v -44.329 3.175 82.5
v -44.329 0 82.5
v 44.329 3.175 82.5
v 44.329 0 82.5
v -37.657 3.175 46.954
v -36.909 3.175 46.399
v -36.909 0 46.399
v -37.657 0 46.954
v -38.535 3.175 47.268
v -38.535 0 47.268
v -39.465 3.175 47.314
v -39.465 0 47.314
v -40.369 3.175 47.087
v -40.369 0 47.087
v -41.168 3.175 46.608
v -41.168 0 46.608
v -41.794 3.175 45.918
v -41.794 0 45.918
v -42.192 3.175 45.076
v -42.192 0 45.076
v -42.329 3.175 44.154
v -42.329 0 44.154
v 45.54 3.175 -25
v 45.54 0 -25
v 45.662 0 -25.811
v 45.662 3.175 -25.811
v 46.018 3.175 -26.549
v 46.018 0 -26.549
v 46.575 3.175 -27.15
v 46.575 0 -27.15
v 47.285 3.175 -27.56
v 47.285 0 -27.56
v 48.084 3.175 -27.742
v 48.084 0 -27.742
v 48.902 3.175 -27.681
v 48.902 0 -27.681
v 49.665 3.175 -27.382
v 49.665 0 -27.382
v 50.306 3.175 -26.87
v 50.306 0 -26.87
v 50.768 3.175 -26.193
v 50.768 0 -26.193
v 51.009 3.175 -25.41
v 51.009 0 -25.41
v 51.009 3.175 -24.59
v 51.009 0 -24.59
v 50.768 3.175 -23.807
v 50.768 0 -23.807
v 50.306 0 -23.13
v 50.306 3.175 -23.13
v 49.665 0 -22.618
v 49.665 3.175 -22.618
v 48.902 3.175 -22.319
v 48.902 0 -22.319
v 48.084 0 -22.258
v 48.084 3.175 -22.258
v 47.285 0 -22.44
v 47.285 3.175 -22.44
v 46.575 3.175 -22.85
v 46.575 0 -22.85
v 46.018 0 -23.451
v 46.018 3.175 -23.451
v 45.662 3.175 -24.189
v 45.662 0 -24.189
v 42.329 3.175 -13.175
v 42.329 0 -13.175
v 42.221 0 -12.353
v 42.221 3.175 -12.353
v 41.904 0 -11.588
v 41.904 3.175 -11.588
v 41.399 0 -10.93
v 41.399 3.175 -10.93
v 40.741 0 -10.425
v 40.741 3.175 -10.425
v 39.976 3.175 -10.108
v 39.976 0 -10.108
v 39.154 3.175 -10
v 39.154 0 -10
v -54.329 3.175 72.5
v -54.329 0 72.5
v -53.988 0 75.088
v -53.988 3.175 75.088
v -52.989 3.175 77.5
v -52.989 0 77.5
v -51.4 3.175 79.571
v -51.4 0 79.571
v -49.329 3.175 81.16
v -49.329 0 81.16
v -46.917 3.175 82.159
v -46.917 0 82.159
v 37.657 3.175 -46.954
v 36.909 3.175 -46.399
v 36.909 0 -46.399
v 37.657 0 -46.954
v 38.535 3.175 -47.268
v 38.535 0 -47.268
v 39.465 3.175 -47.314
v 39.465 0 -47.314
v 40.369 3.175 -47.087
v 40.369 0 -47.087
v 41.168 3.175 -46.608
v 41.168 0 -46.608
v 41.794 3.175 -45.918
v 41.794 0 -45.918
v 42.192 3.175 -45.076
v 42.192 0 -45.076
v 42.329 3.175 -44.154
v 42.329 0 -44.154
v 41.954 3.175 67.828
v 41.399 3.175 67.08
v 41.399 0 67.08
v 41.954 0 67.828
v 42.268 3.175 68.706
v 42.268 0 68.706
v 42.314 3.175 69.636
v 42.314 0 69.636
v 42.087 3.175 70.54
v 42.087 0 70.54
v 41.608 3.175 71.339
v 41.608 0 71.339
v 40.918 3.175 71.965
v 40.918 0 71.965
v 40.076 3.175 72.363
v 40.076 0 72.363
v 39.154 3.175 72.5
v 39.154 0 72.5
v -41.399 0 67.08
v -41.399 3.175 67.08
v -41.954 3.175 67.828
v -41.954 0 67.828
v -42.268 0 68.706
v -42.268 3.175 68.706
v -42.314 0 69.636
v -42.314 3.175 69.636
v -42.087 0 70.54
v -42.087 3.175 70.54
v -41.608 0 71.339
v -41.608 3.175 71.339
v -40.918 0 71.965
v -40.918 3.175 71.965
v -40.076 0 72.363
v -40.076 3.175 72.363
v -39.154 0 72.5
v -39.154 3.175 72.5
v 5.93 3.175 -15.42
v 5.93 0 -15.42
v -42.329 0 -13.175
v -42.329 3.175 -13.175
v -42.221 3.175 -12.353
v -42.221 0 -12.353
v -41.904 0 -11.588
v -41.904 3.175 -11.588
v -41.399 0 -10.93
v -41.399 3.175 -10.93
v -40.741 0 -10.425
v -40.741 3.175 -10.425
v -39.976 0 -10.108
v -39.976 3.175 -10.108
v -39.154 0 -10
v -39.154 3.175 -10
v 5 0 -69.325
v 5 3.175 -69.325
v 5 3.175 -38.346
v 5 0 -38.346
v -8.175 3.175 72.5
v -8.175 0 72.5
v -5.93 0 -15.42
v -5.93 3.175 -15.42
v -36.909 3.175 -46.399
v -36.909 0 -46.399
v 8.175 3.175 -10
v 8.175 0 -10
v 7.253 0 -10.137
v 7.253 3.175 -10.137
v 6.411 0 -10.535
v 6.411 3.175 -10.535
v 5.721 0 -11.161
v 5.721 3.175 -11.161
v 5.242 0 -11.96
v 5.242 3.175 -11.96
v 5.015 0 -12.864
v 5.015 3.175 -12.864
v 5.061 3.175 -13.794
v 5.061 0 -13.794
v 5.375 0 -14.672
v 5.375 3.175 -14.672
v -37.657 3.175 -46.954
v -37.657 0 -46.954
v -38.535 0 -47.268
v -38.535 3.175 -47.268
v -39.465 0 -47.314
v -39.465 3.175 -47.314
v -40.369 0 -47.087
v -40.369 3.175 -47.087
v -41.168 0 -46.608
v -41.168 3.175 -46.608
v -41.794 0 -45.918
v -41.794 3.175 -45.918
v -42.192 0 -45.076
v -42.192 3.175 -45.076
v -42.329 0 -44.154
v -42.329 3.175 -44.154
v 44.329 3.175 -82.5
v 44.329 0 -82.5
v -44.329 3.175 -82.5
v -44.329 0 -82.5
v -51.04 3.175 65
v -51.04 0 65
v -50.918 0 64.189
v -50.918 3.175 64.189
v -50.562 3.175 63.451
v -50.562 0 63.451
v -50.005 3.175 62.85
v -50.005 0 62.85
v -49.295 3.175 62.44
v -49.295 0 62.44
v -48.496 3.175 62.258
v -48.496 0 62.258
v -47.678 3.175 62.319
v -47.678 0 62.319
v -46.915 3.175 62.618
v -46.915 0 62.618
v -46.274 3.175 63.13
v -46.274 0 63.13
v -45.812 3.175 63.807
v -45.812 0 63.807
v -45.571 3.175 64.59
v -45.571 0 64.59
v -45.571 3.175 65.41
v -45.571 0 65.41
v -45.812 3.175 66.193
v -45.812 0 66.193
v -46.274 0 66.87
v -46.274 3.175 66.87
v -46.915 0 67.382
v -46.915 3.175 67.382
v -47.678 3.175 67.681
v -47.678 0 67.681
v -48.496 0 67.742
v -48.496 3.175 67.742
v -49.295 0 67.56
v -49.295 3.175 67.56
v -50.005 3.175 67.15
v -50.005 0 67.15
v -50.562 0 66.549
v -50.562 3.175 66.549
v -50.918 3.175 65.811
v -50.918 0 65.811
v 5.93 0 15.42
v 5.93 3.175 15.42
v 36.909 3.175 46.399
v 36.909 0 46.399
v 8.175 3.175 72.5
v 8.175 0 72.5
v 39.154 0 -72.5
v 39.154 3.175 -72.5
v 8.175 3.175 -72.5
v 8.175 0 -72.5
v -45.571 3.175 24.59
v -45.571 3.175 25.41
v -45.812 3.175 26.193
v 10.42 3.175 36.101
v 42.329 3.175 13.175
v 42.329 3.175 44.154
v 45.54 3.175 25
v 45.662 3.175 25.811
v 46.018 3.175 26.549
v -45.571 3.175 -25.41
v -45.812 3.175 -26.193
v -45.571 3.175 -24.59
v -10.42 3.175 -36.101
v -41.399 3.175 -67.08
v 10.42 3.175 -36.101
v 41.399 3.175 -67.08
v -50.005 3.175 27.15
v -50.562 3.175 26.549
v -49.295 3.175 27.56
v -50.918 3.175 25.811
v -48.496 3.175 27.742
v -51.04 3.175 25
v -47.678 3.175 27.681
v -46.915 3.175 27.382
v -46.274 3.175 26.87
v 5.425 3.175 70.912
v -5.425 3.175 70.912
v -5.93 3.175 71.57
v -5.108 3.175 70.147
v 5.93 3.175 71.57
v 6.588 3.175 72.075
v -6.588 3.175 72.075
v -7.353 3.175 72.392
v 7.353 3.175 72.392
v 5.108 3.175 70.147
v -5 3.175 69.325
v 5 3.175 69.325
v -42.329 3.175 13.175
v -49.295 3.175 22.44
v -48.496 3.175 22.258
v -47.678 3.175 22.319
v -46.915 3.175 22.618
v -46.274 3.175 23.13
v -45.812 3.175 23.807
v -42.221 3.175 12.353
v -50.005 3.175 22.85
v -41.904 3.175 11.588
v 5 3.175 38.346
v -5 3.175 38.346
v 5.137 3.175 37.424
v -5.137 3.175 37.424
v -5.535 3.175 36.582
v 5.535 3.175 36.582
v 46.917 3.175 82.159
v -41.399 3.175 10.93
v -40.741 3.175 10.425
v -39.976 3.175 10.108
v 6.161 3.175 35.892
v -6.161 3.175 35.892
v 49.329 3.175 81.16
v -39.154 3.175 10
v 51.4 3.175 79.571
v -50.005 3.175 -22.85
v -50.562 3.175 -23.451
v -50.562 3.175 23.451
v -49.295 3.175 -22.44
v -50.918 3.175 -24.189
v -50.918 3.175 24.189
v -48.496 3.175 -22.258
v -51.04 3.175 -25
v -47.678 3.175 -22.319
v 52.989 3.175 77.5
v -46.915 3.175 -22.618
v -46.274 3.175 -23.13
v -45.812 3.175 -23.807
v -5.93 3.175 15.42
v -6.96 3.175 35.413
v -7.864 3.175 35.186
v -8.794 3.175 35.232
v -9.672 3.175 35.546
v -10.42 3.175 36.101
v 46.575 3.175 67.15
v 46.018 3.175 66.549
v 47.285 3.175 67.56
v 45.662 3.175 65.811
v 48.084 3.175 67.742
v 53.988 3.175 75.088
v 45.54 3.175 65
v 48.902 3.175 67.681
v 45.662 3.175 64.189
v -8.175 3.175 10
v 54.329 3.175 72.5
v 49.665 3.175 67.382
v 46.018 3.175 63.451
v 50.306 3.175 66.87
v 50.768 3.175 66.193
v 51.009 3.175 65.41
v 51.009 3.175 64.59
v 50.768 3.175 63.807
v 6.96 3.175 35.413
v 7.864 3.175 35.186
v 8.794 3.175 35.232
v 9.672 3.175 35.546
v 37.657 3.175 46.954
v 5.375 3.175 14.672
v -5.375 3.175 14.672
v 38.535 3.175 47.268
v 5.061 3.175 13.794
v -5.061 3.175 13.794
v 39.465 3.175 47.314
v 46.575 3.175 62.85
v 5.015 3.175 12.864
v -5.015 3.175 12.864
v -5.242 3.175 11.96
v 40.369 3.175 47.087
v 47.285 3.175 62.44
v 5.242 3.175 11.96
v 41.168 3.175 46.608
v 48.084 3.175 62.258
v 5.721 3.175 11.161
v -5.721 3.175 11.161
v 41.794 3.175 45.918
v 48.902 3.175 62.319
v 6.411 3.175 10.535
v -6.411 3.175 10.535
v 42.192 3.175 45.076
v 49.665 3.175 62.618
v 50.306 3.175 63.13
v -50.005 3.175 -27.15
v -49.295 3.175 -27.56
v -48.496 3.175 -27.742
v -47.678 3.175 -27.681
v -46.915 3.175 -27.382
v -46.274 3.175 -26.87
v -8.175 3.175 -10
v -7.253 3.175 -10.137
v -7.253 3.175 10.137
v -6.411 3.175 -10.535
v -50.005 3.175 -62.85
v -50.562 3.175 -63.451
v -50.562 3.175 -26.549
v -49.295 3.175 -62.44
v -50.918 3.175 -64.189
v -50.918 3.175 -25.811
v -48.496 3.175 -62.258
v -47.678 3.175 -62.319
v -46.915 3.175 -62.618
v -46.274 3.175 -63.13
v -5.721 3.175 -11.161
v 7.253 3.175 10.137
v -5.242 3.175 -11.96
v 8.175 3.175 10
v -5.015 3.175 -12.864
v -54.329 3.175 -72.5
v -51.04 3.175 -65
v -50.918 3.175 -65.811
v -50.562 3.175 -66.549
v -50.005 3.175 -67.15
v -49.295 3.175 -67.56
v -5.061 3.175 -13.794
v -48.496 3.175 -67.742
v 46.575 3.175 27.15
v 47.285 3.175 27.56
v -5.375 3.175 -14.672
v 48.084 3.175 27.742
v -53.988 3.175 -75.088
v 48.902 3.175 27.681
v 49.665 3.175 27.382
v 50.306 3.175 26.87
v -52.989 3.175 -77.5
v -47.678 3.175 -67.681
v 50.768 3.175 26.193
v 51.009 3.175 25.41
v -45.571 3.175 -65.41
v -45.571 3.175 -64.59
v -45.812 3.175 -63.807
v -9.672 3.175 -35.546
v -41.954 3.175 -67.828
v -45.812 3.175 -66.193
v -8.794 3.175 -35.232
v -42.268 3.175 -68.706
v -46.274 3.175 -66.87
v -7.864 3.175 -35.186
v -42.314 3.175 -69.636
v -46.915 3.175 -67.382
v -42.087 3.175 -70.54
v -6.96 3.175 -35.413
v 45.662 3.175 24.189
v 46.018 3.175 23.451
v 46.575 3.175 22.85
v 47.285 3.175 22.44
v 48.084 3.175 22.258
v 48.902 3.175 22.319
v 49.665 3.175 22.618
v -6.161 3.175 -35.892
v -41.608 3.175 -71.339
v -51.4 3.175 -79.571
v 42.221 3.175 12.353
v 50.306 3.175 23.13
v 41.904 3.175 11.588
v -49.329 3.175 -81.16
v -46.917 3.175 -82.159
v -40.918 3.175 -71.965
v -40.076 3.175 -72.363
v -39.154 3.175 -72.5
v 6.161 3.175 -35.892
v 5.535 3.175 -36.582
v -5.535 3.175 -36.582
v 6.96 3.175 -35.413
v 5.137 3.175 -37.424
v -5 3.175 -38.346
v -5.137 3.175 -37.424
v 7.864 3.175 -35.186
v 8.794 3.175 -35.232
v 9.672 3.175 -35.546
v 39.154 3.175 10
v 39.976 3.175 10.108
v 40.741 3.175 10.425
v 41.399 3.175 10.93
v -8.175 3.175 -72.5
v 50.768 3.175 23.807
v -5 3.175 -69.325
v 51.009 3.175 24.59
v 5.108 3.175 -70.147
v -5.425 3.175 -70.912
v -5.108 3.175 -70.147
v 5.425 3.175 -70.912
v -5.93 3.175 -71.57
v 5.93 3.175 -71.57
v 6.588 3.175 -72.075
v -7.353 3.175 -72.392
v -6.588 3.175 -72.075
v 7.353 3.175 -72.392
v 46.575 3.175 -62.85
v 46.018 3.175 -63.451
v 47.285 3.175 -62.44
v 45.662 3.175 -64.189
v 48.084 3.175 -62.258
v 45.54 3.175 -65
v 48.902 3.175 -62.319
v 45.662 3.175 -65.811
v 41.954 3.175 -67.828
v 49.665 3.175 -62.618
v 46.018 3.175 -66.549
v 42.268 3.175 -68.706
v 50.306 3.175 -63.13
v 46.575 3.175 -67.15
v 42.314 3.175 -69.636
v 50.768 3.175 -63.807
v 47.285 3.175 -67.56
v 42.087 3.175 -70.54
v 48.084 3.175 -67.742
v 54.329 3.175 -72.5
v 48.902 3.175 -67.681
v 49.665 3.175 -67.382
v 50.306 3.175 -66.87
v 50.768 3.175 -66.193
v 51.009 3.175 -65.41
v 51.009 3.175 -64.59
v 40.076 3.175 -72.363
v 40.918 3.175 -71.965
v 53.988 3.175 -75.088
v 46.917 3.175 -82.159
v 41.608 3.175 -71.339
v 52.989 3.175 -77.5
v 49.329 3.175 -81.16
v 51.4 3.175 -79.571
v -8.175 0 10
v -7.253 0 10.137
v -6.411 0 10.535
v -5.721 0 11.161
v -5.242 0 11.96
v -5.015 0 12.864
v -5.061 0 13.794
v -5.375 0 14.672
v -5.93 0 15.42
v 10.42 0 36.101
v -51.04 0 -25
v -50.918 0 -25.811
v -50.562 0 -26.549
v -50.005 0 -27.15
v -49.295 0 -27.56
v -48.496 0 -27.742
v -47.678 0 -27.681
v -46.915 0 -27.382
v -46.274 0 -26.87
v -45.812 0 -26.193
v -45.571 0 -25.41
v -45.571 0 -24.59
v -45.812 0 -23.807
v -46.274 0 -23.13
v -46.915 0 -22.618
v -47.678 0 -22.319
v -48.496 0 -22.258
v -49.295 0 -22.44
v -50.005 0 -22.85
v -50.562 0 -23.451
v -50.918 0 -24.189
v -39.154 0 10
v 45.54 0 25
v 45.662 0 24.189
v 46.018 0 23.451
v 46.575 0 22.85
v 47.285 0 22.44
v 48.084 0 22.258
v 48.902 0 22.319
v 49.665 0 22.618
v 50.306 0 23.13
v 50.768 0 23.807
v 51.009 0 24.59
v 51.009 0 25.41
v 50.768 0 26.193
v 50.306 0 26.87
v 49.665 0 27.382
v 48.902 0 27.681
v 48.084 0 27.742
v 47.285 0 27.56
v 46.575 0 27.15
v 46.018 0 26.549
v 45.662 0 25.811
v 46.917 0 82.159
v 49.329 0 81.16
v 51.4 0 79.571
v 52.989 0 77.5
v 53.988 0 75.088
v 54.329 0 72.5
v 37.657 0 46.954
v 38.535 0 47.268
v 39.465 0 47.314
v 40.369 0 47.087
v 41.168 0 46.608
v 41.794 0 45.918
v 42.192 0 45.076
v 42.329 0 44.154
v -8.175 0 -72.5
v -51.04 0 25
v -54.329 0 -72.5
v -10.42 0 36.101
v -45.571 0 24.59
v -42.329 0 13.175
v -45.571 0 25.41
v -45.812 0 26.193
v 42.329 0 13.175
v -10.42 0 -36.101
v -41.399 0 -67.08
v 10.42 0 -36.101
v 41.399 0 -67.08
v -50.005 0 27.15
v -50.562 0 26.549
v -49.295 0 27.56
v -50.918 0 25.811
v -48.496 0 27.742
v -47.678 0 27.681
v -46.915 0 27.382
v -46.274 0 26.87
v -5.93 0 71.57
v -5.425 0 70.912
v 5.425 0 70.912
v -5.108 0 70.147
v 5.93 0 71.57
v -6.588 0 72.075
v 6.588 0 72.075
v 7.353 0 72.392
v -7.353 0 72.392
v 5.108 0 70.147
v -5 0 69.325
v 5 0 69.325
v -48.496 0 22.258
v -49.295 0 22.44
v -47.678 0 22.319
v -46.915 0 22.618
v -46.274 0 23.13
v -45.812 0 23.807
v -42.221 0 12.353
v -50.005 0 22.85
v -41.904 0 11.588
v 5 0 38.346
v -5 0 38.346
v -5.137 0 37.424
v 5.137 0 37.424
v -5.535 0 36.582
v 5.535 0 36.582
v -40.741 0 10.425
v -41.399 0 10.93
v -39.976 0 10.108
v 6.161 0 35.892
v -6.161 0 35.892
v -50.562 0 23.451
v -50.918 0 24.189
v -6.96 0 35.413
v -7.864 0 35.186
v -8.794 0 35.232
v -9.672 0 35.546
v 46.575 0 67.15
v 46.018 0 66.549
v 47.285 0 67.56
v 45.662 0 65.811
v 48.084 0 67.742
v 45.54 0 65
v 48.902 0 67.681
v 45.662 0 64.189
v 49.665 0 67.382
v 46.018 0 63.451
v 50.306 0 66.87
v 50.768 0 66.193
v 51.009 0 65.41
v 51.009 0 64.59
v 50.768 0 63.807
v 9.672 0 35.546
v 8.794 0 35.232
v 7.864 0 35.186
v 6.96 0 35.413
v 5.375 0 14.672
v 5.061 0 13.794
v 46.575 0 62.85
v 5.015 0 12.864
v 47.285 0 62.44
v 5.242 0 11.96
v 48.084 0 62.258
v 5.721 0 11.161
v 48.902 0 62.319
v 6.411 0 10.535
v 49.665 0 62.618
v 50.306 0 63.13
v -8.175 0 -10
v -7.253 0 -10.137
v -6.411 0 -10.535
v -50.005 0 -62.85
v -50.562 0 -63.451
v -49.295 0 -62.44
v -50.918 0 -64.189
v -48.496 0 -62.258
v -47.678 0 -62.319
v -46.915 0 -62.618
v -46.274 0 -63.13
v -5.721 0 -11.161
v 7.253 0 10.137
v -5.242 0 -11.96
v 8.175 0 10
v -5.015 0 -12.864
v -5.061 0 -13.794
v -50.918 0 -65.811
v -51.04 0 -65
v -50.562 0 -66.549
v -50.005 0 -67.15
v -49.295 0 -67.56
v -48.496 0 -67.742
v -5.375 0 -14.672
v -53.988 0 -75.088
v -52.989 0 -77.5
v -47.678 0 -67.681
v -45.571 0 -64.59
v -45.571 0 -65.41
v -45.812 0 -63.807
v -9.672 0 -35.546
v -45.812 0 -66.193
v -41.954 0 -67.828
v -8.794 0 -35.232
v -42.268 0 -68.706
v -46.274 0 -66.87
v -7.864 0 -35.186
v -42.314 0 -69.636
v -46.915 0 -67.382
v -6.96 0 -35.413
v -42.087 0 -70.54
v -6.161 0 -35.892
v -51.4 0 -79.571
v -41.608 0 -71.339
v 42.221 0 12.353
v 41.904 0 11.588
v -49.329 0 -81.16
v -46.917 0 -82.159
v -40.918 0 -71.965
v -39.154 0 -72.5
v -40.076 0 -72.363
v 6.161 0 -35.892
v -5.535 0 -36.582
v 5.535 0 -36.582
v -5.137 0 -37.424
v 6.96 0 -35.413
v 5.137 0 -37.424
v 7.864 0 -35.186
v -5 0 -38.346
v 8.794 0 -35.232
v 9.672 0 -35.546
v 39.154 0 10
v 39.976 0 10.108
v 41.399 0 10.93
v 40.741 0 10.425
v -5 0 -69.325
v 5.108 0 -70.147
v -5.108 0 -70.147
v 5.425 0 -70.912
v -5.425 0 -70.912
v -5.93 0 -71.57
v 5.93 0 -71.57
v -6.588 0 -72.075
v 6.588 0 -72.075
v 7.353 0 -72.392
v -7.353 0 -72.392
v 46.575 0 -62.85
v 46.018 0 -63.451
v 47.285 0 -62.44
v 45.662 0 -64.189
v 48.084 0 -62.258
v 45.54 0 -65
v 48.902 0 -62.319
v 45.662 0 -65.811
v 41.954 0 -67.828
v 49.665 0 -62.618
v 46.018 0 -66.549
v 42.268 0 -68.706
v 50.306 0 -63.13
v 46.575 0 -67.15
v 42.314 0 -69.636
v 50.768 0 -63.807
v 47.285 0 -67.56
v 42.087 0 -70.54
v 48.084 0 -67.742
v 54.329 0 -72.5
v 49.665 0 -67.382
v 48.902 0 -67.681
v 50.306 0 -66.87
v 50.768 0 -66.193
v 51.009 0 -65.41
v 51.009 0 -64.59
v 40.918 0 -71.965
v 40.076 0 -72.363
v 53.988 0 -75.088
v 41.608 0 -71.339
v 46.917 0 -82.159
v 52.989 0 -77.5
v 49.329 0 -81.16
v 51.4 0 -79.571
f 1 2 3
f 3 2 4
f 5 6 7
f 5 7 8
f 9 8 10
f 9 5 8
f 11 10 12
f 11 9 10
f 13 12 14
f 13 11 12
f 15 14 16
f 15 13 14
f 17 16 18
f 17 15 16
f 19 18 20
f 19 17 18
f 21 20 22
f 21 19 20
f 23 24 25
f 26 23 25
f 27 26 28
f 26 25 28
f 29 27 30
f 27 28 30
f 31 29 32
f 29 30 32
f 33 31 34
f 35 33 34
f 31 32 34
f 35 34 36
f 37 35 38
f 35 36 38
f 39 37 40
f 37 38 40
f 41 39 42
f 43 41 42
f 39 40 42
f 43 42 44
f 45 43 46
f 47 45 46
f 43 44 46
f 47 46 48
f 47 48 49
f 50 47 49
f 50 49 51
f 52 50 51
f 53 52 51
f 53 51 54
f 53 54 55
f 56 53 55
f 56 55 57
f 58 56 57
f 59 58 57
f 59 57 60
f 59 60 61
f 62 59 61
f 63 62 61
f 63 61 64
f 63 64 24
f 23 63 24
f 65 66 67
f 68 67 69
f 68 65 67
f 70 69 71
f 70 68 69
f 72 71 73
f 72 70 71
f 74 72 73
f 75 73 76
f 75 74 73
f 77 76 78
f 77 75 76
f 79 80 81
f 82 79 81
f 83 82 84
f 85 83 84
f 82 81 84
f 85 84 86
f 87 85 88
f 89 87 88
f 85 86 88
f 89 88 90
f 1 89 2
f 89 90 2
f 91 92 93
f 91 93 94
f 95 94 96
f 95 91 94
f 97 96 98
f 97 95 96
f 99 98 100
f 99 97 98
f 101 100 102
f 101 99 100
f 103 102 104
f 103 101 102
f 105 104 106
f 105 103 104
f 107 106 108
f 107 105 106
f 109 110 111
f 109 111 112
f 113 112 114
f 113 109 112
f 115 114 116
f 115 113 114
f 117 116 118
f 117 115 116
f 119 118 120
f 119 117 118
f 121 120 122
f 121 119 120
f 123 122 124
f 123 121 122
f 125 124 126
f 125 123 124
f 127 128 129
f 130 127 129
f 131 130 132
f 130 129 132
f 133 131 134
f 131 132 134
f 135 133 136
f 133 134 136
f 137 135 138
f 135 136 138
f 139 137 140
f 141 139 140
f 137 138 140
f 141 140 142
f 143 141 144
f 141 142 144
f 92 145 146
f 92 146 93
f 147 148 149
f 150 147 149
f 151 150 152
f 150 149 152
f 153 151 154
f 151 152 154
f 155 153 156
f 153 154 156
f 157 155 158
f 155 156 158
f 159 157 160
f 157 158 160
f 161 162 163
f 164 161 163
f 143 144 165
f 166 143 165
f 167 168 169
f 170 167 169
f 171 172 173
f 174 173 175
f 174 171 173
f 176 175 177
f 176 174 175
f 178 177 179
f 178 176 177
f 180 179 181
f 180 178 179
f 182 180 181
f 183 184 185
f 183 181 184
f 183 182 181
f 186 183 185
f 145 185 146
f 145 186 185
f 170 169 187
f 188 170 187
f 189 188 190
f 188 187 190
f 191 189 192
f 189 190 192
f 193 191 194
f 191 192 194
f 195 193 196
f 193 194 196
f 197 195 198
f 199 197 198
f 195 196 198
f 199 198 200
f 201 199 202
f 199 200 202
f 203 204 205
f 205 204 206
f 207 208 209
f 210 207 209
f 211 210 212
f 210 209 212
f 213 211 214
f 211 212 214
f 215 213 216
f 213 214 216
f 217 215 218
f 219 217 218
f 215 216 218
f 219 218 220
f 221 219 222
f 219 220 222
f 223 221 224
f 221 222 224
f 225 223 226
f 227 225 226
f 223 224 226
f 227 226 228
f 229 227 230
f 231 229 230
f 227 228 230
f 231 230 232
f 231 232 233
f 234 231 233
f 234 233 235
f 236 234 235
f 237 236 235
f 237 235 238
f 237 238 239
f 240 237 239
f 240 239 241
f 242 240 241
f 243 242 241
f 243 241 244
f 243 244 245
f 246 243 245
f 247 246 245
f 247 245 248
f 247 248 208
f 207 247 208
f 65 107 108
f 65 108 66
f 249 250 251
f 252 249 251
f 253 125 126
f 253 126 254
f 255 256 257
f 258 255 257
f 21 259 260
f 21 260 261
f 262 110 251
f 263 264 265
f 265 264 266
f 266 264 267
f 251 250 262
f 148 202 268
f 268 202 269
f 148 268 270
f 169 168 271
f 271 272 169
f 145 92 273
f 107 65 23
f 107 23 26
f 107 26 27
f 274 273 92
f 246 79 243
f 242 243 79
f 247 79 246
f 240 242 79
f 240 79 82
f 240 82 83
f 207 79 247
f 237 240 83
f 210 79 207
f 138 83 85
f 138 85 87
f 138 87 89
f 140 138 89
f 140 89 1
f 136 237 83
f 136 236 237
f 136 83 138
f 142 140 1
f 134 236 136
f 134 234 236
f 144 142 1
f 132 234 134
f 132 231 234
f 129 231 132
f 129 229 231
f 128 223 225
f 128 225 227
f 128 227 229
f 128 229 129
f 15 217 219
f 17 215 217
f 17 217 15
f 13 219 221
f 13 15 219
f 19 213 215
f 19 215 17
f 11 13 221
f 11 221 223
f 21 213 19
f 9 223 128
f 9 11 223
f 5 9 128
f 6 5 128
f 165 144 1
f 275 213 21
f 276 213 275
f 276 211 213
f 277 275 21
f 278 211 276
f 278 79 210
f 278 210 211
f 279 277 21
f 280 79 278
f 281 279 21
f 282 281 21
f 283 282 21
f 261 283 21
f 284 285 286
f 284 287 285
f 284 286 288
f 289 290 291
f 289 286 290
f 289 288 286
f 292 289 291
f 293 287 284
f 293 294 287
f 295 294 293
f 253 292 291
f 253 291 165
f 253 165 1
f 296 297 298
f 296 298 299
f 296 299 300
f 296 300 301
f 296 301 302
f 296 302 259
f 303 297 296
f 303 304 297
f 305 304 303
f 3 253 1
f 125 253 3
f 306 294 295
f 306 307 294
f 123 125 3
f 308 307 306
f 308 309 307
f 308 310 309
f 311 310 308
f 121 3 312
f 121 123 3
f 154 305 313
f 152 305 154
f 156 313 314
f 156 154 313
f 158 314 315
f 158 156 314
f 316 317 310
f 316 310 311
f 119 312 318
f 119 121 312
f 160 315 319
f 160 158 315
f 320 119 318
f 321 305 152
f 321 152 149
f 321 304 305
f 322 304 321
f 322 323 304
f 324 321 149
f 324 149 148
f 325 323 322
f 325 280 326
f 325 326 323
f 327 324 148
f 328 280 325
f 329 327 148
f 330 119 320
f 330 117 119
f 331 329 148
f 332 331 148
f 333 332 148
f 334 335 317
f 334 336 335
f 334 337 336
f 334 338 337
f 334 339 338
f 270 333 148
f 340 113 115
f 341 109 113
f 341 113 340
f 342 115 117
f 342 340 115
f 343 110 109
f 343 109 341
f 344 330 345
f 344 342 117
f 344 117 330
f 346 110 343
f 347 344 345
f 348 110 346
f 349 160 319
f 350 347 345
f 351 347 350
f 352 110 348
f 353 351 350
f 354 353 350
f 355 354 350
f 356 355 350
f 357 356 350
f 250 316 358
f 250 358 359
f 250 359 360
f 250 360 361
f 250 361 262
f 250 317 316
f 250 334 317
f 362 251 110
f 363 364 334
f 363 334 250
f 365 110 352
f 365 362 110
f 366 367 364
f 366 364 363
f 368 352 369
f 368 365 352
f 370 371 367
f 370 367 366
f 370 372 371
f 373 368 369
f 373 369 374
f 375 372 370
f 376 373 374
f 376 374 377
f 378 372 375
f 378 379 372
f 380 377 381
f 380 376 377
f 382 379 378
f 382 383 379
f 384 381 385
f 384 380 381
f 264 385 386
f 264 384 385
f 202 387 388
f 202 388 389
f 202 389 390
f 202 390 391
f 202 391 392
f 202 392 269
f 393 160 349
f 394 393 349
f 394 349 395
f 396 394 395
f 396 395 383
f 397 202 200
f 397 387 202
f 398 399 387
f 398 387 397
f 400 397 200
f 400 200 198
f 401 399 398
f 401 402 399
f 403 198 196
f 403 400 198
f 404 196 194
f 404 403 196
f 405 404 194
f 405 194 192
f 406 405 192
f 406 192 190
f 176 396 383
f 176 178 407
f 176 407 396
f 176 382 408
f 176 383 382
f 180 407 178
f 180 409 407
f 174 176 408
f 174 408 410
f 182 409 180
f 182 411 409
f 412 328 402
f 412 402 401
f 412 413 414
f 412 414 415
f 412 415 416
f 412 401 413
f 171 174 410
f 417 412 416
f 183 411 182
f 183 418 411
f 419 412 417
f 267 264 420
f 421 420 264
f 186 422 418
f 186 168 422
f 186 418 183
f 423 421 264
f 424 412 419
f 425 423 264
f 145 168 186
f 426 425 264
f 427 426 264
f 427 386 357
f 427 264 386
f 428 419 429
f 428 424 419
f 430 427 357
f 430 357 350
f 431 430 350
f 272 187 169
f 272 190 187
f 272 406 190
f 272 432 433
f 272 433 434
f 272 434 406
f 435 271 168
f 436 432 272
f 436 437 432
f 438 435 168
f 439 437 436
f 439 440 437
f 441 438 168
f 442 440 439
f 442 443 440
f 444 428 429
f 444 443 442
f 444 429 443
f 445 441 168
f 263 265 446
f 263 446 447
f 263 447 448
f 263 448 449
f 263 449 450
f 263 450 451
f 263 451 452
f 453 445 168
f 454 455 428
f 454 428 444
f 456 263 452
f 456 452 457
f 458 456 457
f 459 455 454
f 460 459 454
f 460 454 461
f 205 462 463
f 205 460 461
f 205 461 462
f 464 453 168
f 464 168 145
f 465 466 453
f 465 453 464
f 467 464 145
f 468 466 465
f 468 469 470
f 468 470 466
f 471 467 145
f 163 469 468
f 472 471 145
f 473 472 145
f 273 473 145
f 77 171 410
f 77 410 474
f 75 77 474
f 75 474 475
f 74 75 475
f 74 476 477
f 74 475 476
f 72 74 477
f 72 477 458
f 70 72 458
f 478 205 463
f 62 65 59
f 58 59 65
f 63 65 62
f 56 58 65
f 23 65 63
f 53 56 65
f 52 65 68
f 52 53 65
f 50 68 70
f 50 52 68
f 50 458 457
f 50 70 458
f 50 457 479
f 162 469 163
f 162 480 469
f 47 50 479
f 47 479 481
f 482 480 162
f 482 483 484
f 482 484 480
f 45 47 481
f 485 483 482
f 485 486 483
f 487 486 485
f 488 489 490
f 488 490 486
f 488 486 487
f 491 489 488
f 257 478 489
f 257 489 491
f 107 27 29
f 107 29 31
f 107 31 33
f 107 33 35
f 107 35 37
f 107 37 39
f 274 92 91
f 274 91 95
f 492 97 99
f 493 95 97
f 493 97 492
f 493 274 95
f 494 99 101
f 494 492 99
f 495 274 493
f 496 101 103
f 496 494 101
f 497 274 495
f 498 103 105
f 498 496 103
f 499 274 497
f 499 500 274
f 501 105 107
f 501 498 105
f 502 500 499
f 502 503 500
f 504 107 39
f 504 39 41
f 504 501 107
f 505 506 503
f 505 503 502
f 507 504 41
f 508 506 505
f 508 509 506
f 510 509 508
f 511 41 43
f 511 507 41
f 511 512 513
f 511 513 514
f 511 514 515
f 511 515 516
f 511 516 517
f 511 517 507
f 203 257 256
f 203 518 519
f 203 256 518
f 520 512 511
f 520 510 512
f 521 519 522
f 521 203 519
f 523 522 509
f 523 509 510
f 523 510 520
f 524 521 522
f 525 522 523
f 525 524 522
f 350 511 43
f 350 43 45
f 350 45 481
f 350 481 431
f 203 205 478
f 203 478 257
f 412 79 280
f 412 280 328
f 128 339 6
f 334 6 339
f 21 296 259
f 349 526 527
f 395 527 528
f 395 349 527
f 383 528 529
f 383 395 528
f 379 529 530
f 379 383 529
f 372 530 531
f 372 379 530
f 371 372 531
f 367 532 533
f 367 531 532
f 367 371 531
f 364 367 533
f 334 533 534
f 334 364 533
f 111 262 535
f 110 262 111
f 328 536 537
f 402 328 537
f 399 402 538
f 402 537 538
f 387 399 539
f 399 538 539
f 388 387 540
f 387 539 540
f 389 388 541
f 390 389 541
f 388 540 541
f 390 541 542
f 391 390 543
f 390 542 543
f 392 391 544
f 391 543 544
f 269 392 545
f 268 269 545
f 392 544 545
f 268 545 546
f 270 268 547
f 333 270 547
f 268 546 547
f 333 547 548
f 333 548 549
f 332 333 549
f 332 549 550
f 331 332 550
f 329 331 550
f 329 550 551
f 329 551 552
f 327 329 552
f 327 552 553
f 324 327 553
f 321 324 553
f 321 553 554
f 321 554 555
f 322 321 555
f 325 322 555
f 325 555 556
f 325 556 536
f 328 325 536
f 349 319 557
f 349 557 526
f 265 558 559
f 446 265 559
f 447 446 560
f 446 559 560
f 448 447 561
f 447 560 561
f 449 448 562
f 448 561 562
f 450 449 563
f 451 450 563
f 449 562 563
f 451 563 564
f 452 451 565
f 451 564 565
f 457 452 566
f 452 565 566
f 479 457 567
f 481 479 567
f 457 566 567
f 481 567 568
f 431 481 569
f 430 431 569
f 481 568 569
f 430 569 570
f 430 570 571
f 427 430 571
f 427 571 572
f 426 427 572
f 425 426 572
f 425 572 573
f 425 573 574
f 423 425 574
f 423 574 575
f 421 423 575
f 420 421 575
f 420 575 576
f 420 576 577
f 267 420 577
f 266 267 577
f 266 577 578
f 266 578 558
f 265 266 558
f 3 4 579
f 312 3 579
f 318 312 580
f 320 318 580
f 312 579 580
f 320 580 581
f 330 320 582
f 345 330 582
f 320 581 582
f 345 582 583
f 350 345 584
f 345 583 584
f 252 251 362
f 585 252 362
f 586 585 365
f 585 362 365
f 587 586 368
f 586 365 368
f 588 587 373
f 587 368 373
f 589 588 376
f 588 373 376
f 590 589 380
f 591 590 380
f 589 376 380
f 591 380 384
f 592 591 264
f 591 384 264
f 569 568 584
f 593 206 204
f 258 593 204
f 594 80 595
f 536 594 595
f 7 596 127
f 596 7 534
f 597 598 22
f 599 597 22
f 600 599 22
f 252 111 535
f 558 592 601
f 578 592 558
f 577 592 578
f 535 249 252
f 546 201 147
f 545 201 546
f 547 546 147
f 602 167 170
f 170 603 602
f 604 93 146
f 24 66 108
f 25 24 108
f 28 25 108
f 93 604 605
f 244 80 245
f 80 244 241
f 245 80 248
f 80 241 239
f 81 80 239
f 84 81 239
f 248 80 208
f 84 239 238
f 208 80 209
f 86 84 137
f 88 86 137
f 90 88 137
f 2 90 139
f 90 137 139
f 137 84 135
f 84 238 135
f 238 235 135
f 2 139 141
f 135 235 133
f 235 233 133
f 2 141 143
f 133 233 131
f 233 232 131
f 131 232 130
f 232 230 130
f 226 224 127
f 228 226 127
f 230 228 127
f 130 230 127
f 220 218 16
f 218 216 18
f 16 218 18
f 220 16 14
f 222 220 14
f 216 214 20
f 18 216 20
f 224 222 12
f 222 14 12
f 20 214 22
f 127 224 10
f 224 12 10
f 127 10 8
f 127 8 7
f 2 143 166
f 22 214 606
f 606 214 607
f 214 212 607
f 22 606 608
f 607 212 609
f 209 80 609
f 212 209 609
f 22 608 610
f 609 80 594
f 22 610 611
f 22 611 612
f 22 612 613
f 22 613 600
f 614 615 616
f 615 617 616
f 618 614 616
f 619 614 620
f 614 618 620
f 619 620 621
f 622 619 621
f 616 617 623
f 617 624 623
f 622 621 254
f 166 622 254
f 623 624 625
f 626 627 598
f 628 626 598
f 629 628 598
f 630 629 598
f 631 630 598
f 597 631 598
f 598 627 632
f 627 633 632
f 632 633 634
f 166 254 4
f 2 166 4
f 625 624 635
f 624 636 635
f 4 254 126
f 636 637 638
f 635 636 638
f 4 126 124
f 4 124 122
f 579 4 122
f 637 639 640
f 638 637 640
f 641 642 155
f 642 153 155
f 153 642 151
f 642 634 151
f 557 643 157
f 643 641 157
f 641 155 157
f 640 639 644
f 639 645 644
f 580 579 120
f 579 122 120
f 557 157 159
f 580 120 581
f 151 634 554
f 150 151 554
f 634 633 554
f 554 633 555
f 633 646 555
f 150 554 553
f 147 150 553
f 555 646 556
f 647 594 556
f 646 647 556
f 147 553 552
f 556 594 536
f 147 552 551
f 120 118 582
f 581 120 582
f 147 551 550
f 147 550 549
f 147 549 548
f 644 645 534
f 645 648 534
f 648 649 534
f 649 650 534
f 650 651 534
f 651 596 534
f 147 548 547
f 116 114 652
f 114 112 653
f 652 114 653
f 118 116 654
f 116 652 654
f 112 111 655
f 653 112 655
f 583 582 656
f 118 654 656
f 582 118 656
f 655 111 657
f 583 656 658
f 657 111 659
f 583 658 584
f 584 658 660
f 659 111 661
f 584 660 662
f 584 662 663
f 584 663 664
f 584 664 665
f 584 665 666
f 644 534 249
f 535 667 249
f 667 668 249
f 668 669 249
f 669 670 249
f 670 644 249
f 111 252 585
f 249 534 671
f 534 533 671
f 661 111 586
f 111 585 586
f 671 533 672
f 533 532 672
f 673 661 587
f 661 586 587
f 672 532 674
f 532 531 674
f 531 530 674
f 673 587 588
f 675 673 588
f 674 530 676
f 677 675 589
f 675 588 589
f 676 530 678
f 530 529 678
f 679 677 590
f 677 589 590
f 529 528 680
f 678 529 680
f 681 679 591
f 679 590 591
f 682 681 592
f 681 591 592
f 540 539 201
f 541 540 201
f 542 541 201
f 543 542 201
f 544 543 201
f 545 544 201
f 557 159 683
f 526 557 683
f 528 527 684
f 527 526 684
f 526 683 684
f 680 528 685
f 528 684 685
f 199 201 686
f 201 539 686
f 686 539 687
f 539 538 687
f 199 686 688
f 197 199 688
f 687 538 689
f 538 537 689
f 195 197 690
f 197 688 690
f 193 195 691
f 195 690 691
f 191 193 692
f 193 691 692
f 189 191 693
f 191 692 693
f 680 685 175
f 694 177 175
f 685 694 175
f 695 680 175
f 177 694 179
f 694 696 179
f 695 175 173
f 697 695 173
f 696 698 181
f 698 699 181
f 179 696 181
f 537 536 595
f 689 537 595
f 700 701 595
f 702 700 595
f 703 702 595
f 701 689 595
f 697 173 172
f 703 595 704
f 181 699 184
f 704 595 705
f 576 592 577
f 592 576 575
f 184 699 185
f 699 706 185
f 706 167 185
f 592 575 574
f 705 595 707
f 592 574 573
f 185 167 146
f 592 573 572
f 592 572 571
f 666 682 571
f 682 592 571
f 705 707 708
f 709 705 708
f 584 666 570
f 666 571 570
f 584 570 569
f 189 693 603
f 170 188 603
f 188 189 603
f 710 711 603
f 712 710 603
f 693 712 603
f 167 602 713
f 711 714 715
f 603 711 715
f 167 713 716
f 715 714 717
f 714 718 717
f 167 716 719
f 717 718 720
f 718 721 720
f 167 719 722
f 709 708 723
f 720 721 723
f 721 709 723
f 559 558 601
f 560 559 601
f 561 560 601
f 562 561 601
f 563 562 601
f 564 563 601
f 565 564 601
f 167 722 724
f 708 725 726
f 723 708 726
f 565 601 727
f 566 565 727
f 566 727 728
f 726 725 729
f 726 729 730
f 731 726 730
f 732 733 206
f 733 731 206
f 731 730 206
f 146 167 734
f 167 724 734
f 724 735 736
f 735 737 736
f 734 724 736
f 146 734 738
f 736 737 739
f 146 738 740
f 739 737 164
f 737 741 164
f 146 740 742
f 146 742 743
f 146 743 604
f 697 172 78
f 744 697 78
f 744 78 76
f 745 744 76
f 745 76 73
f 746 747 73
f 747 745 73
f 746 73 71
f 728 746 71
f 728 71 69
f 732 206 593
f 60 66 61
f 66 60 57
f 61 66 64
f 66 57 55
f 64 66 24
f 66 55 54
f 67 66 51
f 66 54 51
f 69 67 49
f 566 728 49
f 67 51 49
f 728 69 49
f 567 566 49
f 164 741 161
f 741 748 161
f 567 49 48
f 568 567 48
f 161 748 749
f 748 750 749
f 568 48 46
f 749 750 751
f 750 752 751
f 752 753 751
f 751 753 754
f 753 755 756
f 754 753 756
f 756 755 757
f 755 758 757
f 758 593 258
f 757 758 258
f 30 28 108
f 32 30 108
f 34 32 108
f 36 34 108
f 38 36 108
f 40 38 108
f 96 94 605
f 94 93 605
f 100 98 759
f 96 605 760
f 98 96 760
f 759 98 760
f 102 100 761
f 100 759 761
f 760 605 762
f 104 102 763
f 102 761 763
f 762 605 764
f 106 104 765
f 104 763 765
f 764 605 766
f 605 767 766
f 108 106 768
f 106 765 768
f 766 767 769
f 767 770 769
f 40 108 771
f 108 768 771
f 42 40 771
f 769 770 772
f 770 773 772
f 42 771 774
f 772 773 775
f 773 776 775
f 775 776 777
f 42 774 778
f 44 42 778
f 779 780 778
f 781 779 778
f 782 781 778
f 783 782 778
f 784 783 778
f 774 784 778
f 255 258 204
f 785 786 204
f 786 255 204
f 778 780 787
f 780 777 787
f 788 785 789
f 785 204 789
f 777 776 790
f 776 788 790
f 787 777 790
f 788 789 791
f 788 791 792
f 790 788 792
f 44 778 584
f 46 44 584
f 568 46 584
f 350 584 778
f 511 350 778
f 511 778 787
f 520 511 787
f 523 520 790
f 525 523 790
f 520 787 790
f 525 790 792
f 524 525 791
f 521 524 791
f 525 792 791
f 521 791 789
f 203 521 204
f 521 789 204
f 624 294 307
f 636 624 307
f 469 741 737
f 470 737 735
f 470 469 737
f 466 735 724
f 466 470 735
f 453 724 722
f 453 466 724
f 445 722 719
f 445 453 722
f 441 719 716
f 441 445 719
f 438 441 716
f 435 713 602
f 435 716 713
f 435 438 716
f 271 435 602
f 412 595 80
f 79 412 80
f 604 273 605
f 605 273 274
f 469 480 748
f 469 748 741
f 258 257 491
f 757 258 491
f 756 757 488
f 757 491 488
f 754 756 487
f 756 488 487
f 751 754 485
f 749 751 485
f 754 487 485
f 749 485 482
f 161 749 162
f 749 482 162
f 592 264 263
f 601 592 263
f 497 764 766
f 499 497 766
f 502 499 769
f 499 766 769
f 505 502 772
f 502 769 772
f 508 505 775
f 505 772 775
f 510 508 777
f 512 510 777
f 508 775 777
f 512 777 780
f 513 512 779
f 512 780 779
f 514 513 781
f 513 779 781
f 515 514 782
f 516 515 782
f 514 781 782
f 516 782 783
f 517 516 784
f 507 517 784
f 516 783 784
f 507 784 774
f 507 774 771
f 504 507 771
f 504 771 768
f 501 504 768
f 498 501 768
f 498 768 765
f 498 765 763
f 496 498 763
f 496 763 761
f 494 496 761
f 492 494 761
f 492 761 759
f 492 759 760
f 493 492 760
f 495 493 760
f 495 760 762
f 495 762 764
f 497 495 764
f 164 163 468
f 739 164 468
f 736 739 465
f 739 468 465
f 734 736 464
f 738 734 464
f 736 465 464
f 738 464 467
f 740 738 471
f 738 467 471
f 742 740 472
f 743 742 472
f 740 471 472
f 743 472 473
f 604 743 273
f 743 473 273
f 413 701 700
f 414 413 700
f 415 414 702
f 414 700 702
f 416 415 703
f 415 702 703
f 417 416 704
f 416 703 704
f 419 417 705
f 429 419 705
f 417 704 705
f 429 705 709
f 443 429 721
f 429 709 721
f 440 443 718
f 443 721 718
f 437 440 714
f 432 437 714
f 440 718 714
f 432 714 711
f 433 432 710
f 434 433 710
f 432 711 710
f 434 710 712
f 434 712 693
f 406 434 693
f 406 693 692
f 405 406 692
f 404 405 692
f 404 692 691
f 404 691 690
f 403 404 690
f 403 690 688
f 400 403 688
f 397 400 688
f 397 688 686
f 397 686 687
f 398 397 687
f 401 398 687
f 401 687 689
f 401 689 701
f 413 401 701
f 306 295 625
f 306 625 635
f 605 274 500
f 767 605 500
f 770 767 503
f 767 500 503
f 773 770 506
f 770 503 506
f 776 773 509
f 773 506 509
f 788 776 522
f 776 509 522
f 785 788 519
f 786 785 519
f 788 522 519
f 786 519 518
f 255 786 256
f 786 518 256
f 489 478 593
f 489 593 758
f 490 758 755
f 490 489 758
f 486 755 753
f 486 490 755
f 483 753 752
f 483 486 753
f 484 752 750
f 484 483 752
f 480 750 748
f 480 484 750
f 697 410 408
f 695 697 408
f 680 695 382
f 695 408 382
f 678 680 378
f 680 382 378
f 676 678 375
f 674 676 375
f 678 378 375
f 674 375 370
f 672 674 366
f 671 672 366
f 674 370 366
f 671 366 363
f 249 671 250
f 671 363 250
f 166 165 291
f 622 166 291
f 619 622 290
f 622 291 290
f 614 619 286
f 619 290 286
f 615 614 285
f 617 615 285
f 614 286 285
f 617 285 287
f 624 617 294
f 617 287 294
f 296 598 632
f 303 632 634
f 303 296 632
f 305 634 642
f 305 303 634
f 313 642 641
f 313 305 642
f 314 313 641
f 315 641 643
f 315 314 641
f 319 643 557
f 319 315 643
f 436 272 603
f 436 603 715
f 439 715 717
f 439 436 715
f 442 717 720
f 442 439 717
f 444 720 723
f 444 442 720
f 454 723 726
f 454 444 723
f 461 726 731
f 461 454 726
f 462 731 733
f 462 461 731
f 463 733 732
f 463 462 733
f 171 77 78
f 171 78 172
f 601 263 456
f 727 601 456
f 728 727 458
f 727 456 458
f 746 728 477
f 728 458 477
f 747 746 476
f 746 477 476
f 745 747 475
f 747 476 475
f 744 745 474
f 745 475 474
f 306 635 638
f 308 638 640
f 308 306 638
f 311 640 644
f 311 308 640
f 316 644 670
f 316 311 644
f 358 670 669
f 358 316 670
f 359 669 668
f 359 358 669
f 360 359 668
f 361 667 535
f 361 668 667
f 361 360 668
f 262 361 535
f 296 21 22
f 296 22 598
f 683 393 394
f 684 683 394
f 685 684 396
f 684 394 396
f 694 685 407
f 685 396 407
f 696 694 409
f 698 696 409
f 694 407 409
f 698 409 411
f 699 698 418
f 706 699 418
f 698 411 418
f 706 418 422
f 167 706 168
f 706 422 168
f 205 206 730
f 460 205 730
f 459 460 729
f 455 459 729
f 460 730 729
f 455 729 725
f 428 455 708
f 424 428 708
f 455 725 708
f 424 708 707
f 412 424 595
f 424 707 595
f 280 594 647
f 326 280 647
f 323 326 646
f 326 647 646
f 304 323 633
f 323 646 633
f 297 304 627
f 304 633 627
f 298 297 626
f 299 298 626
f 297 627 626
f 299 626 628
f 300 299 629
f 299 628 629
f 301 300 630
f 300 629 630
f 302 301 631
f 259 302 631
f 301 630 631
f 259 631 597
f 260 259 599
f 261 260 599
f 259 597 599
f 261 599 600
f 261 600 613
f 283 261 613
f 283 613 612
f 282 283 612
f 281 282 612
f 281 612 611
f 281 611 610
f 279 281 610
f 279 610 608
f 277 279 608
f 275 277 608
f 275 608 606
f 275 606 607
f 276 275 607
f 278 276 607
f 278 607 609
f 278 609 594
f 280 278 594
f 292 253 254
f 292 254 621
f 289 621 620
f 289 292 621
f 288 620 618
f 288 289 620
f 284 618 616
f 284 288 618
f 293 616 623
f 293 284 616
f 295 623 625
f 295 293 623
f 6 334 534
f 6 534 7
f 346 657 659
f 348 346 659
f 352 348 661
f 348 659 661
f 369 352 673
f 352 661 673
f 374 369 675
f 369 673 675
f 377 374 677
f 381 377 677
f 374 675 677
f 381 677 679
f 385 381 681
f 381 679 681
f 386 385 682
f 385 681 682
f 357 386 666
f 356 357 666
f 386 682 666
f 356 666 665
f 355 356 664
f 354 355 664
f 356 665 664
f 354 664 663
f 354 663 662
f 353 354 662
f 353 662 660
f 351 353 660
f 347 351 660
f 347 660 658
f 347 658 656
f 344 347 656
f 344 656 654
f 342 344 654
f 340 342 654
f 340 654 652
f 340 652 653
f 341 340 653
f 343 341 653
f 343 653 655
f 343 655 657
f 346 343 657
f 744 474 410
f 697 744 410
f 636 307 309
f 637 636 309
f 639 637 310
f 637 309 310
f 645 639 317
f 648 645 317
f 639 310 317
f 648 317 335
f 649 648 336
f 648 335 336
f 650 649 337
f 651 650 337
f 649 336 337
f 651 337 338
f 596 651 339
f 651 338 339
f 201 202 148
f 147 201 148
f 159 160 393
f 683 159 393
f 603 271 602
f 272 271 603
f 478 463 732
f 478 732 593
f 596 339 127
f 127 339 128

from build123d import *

# Parameters (mm, degrees)
BOSS_EXTRUDE1_DEPTH  = 3.175
M5_CLEARANCE_HOLE1_D = 5.5
CUT_EXTRUDE1_DEPTH   = 99.833045415


with BuildPart() as part:
    # Sketch1 → Boss-Extrude1 (new body)
    with BuildSketch(Plane(origin=(0, 0, 0), x_dir=(1, 0, 0), z_dir=(0, 1, 0))):
        with BuildLine():
            Line((-44.329, -82.5), (44.329, -82.5))
            ThreePointArc((44.329, -82.5), (51.400067812, -79.571067812), (54.329, -72.5))
            Line((54.329, -72.5), (54.329, 72.5))
            ThreePointArc((54.329, 72.5), (51.400067812, 79.571067812), (44.329, 82.5))
            Line((44.329, 82.5), (-44.329, 82.5))
            ThreePointArc((-44.329, 82.5), (-51.400067812, 79.571067812), (-54.329, 72.5))
            Line((-54.329, 72.5), (-54.329, -72.5))
            ThreePointArc((-54.329, -72.5), (-51.400067812, -79.571067812), (-44.329, -82.5))
        make_face()
    extrude(amount=BOSS_EXTRUDE1_DEPTH)

    # M5 Clearance Hole1 (through all)
    with Locations(Plane(origin=(0, 3.175, 0), x_dir=(1, 0, 0), z_dir=(0, 1, 0))):
        with Locations((-48.29, 65), (-48.29, -65), (48.29, -65), (48.29, 65), (-48.29, 25), (-48.29, -25), (48.29, 25), (48.29, -25)):
            Hole(M5_CLEARANCE_HOLE1_D / 2)

    # Sketch4 → Cut-Extrude1 (cut, through all)
    with BuildSketch(Plane(origin=(0, 3.175, 0), x_dir=(1, 0, 0), z_dir=(0, 1, 0))):
        with BuildLine():
            Line((-42.329, 44.154), (-42.329, 13.175))
            ThreePointArc((-42.329, 13.175), (-41.39906403, 10.92993597), (-39.154, 10))
            Line((-39.154, 10), (-8.175, 10))
            ThreePointArc((-8.175, 10), (-5.241682484, 11.959980102), (-5.92993597, 15.42006403))
            Line((-5.92993597, 15.42006403), (-36.90893597, 46.39906403))
            ThreePointArc((-36.90893597, 46.39906403), (-40.369019898, 47.087317516), (-42.329, 44.154))
        make_face()
        with BuildLine():
            Line((39.154, 72.5), (8.175, 72.5))
            ThreePointArc((8.175, 72.5), (5.92993597, 71.57006403), (5, 69.325))
            Line((5, 69.325), (5, 38.346))
            ThreePointArc((5, 38.346), (6.959980102, 35.412682484), (10.42006403, 36.10093597))
            Line((10.42006403, 36.10093597), (41.39906403, 67.07993597))
            ThreePointArc((41.39906403, 67.07993597), (42.087317516, 70.540019898), (39.154, 72.5))
        make_face()
        with BuildLine():
            Line((-5, 69.325), (-5, 38.346))
            ThreePointArc((-5, 38.346), (-6.959980102, 35.412682484), (-10.42006403, 36.10093597))
            Line((-10.42006403, 36.10093597), (-41.39906403, 67.07993597))
            ThreePointArc((-41.39906403, 67.07993597), (-42.087317516, 70.540019898), (-39.154, 72.5))
            Line((-39.154, 72.5), (-8.175, 72.5))
            ThreePointArc((-8.175, 72.5), (-5.92993597, 71.57006403), (-5, 69.325))
        make_face()
        with BuildLine():
            Line((5.92993597, 15.42006403), (36.90893597, 46.39906403))
            ThreePointArc((36.90893597, 46.39906403), (40.369019898, 47.087317516), (42.329, 44.154))
            Line((42.329, 44.154), (42.329, 13.175))
            ThreePointArc((42.329, 13.175), (41.39906403, 10.92993597), (39.154, 10))
            Line((39.154, 10), (8.175, 10))
            ThreePointArc((8.175, 10), (5.241682484, 11.959980102), (5.92993597, 15.42006403))
        make_face()
        with BuildLine():
            Line((42.329, -44.154), (42.329, -13.175))
            ThreePointArc((42.329, -13.175), (41.39906403, -10.92993597), (39.154, -10))
            Line((39.154, -10), (8.175, -10))
            ThreePointArc((8.175, -10), (5.241682484, -11.959980102), (5.92993597, -15.42006403))
            Line((5.92993597, -15.42006403), (36.90893597, -46.39906403))
            ThreePointArc((36.90893597, -46.39906403), (40.369019898, -47.087317516), (42.329, -44.154))
        make_face()
        with BuildLine():
            Line((5, -69.325), (5, -38.346))
            ThreePointArc((5, -38.346), (6.959980102, -35.412682484), (10.42006403, -36.10093597))
            Line((10.42006403, -36.10093597), (41.39906403, -67.07993597))
            ThreePointArc((41.39906403, -67.07993597), (42.087317516, -70.540019898), (39.154, -72.5))
            Line((39.154, -72.5), (8.175, -72.5))
            ThreePointArc((8.175, -72.5), (5.92993597, -71.57006403), (5, -69.325))
        make_face()
        with BuildLine():
            Line((-39.154, -72.5), (-8.175, -72.5))
            ThreePointArc((-8.175, -72.5), (-5.92993597, -71.57006403), (-5, -69.325))
            Line((-5, -69.325), (-5, -38.346))
            ThreePointArc((-5, -38.346), (-6.959980102, -35.412682484), (-10.42006403, -36.10093597))
            Line((-10.42006403, -36.10093597), (-41.39906403, -67.07993597))
            ThreePointArc((-41.39906403, -67.07993597), (-42.087317516, -70.540019898), (-39.154, -72.5))
        make_face()
        with BuildLine():
            Line((-5.92993597, -15.42006403), (-36.90893597, -46.39906403))
            ThreePointArc((-36.90893597, -46.39906403), (-40.369019898, -47.087317516), (-42.329, -44.154))
            Line((-42.329, -44.154), (-42.329, -13.175))
            ThreePointArc((-42.329, -13.175), (-41.39906403, -10.92993597), (-39.154, -10))
            Line((-39.154, -10), (-8.175, -10))
            ThreePointArc((-8.175, -10), (-5.241682484, -11.959980102), (-5.92993597, -15.42006403))
        make_face()
    extrude(amount=-CUT_EXTRUDE1_DEPTH, mode=Mode.SUBTRACT)


solid = part.part
